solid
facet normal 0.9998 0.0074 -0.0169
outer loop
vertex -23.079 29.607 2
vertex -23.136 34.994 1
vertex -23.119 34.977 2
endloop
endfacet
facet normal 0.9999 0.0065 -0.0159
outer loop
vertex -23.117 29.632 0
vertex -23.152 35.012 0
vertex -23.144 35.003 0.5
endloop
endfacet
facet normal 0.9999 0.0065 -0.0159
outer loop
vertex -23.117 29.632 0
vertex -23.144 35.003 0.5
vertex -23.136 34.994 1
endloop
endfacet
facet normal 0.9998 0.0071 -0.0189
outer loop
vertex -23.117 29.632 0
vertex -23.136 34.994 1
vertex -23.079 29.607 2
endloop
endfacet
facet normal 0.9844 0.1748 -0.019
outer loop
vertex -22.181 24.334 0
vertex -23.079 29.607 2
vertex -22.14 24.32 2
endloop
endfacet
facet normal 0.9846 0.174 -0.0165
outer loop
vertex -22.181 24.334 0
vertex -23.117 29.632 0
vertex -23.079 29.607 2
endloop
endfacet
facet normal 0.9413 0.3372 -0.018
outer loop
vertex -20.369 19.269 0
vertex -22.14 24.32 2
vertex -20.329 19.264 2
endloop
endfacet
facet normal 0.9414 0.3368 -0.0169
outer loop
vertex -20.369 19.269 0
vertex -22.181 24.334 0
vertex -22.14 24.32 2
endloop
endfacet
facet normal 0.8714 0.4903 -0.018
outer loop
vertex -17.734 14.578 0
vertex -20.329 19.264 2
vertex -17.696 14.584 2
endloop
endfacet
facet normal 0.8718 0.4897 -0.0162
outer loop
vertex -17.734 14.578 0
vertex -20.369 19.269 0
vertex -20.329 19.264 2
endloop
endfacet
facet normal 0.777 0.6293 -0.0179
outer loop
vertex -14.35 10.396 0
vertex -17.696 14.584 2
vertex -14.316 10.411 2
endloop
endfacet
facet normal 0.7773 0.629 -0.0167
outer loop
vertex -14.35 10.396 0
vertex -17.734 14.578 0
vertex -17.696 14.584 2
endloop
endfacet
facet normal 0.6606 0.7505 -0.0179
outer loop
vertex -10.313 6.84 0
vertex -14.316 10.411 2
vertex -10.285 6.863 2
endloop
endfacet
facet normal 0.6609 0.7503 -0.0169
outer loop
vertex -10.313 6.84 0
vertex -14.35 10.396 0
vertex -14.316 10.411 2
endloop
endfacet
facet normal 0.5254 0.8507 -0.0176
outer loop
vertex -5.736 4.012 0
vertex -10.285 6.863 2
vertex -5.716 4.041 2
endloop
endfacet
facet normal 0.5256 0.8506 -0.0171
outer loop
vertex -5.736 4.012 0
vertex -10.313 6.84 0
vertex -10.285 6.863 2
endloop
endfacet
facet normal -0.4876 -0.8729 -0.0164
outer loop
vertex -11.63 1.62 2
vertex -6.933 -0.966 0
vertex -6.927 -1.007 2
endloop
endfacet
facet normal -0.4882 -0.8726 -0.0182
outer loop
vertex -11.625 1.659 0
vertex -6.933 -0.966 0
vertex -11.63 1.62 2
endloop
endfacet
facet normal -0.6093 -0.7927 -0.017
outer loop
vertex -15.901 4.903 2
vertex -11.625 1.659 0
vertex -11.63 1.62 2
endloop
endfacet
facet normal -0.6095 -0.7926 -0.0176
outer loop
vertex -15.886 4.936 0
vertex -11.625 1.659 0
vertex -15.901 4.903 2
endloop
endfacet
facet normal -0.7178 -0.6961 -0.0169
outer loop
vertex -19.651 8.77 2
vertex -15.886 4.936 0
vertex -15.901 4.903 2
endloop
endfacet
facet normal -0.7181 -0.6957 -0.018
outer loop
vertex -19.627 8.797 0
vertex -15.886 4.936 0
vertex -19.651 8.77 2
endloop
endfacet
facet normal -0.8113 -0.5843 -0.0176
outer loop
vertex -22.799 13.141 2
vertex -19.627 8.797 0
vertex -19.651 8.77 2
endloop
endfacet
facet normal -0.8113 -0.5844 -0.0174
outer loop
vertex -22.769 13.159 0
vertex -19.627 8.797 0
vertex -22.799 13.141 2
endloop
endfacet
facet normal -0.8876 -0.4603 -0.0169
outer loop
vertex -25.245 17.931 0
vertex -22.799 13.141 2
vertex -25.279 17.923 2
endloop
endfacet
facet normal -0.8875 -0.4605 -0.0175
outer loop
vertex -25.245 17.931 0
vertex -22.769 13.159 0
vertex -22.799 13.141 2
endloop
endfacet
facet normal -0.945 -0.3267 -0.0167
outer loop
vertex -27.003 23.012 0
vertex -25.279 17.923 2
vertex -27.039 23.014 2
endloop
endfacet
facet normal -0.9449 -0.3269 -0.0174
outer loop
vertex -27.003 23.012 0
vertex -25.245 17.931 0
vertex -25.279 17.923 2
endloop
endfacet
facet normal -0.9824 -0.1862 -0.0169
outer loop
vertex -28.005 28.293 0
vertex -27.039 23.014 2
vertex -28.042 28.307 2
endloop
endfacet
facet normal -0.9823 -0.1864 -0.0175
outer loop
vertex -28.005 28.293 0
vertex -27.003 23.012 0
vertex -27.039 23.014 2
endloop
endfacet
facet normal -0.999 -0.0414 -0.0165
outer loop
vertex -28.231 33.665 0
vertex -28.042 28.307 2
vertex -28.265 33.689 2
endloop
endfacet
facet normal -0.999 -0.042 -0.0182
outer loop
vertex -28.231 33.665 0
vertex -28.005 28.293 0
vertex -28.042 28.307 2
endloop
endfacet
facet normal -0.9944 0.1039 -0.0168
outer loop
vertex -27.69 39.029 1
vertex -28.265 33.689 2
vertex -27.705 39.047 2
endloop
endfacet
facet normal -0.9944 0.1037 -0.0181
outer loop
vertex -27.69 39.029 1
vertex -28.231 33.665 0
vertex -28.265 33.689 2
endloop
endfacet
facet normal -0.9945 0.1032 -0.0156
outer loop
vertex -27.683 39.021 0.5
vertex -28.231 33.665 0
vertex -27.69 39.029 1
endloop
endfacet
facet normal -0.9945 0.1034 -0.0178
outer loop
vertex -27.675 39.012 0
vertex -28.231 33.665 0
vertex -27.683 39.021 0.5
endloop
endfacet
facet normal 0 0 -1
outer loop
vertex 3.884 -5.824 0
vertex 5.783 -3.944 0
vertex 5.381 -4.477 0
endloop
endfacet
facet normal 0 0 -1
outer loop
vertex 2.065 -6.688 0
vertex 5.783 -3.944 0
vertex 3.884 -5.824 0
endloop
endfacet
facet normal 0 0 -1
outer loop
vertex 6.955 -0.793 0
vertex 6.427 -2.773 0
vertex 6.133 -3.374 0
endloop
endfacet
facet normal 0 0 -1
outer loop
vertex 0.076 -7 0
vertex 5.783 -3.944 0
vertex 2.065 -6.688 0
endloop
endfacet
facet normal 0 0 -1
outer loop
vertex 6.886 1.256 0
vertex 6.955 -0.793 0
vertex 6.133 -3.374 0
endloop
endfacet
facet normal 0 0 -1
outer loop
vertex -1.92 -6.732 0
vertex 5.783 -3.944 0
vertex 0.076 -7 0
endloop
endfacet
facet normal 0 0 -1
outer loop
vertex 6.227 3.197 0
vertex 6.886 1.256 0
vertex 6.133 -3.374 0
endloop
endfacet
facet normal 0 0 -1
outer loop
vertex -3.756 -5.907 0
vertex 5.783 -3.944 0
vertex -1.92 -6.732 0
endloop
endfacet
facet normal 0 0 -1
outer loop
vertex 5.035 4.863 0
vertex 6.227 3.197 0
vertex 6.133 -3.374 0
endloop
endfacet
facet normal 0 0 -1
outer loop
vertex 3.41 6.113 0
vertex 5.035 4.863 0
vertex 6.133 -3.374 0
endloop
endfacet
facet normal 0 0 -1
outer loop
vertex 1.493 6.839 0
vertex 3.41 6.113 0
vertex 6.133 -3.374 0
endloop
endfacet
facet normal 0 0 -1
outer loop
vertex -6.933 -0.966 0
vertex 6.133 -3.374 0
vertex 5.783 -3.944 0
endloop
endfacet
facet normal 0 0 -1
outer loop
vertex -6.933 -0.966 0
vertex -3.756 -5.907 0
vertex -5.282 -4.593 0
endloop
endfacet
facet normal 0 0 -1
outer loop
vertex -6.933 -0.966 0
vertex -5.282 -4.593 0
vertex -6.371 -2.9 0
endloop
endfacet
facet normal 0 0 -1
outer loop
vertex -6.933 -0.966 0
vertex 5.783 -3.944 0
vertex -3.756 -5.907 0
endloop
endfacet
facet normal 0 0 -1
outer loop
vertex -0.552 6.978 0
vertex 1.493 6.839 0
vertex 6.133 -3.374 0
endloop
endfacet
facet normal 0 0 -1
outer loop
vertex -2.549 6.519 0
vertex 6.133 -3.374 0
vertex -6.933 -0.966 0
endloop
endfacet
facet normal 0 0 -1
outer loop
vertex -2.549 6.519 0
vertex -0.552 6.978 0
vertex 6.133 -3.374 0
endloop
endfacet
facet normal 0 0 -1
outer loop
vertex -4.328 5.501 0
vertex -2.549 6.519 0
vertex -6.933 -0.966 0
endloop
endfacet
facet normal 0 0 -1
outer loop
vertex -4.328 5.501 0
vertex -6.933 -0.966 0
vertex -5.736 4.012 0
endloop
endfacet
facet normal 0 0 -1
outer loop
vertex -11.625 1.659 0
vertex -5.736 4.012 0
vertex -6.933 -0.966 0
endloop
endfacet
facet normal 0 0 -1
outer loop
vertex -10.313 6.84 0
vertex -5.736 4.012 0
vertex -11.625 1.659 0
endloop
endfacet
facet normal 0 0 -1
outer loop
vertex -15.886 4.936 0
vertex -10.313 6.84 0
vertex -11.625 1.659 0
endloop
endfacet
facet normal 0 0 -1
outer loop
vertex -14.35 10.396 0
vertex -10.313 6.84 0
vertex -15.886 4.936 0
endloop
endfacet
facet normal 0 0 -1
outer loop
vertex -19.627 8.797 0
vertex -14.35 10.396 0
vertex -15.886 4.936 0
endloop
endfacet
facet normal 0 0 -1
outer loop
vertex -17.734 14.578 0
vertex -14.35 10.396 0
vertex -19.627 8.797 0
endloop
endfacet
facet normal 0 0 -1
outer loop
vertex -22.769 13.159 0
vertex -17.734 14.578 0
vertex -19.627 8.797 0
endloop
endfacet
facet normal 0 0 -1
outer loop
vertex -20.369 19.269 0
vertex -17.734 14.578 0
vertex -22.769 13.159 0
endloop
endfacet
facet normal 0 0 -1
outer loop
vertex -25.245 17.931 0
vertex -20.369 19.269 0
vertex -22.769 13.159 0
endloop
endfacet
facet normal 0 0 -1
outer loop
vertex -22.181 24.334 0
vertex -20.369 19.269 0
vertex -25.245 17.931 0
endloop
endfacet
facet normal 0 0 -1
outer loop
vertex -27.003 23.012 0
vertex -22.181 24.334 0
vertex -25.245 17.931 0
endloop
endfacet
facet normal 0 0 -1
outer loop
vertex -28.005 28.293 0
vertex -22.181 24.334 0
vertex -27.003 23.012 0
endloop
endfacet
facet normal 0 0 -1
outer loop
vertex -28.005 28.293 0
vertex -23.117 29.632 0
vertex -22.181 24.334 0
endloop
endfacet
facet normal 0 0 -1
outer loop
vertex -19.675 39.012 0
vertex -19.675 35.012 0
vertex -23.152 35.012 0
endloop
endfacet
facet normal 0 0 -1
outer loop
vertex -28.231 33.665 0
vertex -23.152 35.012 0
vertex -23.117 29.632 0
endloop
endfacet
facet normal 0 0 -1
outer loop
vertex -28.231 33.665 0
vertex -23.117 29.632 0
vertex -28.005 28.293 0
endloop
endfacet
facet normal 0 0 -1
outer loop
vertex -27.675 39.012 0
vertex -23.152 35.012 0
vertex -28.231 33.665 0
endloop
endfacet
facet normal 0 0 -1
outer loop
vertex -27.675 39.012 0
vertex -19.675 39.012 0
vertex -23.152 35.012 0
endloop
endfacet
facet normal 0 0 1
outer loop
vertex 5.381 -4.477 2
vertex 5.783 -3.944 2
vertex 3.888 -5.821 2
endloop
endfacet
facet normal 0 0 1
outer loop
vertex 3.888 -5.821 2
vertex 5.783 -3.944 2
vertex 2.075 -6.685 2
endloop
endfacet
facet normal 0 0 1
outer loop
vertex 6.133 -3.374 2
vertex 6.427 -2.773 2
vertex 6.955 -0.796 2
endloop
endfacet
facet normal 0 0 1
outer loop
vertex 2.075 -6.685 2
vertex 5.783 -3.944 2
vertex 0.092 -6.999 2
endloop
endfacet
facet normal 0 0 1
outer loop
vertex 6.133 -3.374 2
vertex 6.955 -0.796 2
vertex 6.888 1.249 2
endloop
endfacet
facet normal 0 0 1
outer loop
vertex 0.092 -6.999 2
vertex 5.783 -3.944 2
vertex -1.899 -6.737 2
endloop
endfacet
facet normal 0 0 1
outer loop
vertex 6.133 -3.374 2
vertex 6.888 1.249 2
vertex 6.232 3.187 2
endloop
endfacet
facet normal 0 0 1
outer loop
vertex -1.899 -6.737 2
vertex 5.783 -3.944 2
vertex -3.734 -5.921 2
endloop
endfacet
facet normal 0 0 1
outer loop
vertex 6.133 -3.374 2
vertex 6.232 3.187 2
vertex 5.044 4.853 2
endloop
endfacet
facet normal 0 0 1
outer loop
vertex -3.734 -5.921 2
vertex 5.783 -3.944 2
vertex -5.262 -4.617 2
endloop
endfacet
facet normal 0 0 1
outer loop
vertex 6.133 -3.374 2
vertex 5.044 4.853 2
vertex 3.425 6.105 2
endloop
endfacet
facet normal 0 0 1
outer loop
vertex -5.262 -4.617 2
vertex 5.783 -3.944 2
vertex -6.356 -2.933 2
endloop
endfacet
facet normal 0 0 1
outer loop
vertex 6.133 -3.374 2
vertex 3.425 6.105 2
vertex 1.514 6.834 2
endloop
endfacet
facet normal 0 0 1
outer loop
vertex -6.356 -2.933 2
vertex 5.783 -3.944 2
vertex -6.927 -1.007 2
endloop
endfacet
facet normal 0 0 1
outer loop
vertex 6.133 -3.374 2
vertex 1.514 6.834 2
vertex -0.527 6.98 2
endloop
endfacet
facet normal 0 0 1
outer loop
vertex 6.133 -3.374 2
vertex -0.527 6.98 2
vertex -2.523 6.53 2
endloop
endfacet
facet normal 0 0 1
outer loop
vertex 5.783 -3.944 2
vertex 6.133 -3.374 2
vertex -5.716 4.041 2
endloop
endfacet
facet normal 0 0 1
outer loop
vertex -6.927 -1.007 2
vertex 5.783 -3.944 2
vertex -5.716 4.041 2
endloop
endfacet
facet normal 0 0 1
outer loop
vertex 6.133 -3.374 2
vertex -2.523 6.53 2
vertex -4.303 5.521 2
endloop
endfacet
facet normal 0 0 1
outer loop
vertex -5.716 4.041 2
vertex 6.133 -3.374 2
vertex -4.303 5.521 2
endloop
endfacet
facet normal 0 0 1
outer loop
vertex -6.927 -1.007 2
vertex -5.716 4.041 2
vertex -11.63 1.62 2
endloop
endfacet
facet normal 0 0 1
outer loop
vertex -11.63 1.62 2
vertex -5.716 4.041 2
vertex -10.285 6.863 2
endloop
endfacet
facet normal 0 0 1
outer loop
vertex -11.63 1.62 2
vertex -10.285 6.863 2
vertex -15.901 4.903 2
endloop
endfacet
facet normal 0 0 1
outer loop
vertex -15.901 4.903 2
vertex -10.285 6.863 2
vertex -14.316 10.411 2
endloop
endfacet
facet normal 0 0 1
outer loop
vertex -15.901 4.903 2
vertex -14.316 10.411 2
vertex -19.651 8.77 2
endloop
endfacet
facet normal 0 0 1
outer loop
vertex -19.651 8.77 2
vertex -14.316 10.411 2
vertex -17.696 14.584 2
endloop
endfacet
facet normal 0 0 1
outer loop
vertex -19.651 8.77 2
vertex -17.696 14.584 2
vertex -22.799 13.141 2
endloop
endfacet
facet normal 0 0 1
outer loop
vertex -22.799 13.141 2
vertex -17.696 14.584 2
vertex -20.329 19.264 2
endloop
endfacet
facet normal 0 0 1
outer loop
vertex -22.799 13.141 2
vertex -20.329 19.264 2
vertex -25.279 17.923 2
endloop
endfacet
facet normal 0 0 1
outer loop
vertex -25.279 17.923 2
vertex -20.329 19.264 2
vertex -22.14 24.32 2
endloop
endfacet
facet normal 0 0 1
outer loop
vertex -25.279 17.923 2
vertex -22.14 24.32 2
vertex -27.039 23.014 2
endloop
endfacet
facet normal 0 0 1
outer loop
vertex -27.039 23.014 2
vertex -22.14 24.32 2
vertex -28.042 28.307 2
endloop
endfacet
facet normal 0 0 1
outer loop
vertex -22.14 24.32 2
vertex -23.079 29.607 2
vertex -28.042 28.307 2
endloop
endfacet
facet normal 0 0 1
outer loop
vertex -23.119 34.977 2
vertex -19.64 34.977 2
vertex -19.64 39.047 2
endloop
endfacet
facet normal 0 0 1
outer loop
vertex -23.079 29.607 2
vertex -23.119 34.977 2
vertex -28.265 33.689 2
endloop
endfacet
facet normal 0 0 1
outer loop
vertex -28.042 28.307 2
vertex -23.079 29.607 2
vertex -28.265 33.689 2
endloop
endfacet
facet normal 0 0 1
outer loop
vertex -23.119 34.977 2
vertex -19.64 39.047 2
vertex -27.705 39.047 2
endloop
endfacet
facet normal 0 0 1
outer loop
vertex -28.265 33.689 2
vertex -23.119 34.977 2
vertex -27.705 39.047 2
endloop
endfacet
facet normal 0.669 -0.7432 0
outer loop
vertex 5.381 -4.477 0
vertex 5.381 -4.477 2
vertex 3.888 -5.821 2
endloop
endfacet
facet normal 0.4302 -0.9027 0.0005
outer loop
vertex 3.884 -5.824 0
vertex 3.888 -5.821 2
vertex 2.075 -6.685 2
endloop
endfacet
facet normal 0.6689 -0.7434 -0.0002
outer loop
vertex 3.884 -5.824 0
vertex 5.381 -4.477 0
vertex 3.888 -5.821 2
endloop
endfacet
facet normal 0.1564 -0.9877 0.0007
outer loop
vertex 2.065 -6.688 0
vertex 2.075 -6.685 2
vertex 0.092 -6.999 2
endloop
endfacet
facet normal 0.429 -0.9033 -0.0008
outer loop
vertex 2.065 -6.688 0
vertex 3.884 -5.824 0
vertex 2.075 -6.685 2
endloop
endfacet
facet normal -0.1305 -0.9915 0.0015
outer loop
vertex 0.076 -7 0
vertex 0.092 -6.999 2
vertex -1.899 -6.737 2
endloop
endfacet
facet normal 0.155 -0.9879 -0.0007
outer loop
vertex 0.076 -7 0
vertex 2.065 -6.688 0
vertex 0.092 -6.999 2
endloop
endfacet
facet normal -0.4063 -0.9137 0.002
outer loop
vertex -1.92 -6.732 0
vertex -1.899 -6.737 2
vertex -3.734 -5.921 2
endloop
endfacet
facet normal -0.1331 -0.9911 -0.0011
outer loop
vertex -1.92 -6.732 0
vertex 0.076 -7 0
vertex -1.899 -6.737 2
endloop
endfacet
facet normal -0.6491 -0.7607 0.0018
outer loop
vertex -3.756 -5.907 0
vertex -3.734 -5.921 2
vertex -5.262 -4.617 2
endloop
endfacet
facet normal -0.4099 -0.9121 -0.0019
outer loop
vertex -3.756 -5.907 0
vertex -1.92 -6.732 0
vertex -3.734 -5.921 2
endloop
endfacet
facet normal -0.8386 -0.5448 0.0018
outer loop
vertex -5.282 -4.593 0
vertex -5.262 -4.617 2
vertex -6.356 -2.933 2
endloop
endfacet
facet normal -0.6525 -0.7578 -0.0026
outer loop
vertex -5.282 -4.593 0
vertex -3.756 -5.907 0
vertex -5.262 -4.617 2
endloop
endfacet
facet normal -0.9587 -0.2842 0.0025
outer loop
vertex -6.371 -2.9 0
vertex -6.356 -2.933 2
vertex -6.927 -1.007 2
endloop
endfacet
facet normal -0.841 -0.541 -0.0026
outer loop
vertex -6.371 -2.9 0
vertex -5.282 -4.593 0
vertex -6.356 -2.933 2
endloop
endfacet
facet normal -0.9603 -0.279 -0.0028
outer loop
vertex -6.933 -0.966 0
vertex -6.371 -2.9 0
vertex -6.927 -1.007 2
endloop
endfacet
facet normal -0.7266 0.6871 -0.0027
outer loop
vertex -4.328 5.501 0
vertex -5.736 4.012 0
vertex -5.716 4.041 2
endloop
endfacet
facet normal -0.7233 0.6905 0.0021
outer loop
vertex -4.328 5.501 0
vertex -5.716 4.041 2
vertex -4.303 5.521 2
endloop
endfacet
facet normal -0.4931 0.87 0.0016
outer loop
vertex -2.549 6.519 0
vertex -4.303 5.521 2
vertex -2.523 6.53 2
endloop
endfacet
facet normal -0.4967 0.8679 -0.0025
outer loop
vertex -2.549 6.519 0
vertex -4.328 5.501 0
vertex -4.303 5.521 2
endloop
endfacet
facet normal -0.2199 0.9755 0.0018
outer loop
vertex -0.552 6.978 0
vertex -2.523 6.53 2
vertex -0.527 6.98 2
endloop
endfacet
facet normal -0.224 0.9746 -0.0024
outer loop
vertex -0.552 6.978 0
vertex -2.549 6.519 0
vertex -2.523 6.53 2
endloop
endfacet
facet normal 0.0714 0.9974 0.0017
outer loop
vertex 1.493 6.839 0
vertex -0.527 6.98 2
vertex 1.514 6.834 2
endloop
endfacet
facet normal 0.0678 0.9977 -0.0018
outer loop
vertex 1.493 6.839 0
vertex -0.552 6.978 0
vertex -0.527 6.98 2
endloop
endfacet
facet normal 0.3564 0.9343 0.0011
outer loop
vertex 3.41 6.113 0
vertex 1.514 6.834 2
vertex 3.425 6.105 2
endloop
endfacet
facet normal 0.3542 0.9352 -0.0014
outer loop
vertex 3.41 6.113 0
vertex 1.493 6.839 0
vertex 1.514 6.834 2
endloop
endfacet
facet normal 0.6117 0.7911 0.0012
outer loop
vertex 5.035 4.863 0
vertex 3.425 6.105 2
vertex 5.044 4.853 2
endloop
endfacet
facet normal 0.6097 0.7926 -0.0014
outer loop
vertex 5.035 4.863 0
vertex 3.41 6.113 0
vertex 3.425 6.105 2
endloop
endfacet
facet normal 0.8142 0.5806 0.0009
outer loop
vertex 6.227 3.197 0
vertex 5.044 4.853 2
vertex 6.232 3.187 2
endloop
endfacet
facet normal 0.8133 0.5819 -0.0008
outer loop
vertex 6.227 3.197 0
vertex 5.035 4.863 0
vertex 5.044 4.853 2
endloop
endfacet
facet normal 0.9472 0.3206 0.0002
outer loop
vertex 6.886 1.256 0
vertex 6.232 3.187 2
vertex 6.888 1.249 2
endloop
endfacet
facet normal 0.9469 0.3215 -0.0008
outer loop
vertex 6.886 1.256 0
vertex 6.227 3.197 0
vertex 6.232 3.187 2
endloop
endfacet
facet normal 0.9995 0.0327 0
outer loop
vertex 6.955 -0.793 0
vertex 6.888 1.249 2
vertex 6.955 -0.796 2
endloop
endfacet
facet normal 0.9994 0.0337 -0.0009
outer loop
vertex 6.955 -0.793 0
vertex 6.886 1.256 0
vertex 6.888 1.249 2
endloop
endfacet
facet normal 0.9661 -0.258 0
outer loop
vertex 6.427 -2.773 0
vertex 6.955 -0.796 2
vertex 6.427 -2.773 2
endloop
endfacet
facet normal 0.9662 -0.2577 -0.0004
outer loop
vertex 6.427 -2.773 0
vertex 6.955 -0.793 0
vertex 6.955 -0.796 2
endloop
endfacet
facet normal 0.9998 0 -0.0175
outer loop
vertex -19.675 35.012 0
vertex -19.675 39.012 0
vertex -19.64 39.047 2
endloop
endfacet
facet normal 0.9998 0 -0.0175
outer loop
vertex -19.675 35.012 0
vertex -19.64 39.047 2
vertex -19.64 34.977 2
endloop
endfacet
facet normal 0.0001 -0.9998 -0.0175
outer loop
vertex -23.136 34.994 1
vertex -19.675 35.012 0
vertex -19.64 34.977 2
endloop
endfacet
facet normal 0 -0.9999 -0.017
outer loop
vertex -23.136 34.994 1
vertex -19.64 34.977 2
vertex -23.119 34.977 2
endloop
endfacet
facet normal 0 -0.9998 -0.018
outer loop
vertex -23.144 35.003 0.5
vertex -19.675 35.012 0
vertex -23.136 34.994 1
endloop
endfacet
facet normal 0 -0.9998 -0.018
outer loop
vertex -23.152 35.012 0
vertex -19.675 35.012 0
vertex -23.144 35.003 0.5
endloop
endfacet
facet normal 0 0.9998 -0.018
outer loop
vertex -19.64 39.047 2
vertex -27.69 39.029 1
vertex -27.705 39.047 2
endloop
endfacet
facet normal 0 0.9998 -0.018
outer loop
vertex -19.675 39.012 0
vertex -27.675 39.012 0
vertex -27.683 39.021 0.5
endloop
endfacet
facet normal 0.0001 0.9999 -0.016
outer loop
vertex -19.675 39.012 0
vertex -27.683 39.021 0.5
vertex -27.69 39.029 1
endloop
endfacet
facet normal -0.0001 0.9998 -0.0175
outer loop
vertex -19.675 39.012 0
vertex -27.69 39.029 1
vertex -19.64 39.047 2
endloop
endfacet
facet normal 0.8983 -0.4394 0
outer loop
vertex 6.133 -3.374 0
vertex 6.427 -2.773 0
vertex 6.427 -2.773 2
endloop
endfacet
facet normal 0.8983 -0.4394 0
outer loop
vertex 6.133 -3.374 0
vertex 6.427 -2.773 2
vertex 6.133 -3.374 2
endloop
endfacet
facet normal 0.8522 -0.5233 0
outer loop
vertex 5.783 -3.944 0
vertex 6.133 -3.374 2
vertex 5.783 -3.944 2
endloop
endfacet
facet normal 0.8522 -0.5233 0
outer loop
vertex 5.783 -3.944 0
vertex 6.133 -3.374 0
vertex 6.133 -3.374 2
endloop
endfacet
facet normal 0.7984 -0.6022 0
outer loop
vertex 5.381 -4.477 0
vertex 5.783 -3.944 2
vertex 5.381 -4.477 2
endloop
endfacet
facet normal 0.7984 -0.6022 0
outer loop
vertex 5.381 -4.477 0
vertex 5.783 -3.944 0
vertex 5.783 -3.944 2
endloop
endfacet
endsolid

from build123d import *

# Parameters (mm, degrees)
BOSS_EXTRU_2_DEPTH = 2
BOSS_EXTRU_8_DEPTH = 2
BOSS_EXTRU_8_DRAFT = 1


with BuildPart() as part:
    # Esquisse1 → Boss.-Extru.2 (new body)
    with BuildSketch(Plane.XY):
        with BuildLine():
            ThreePointArc((6.427291801, -2.77307052), (5.965216185, -3.662812562), (5.380773926, -4.477418002))
            ThreePointArc((5.380773926, -4.477418002), (-5.965216185, 3.662812562), (6.427291801, -2.77307052))
        make_face()
    extrude(amount=BOSS_EXTRU_2_DEPTH)


with BuildPart() as boss_extru_8_tool:
    # Esquisse7 → Boss.-Extru.8 (with draft: the straight prism first)
    with BuildSketch(Plane(origin=(0, 0, 0), x_dir=(-1, 0, 0), z_dir=(0, 0, -1))):
        with BuildLine():
            Line((27.675381467, 39.011893522), (19.675381467, 39.011893522))
            Line((19.675381467, 39.011893522), (19.675381467, 35.011893522))
            Line((19.675381467, 35.011893522), (23.151678354, 35.011893522))
            ThreePointArc((23.151678354, 35.011893522), (19.150512425, 16.86781666), (5.736262752, 4.011893522))
            ThreePointArc((5.736262752, 4.011893522), (6.806086868, 1.636209506), (6.933004295, -0.966152912))
            ThreePointArc((6.933004295, -0.966152912), (24.093742024, 15.500152171), (27.675381467, 39.011893522))
        make_face()
    extrude(amount=-BOSS_EXTRU_8_DEPTH)
    # Boss.-Extru.8: the draft: its side faces are tilted about the plane it starts from
    boss_extru_8_sides = [boss_extru_8_tool.faces().sort_by_distance(p)[0] for p in [
        (-24.093742024, 15.500152171, 1),
        (-23.675381467, 39.011893522, 1),
        (-19.675381467, 37.011893522, 1),
        (-21.413529911, 35.011893522, 1),
        (-19.150512425, 16.86781666, 1),
        (-6.806086868, 1.636209506, 1),
    ]]
    draft(boss_extru_8_sides, Plane(origin=(0, 0, 0), x_dir=(-1, 0, 0), z_dir=(0, 0, -1)), BOSS_EXTRU_8_DRAFT)


with BuildPart() as part_1:
    add(part.part)

    # Boss.-Extru.8: add boss_extru_8_tool
    add(boss_extru_8_tool.part)


solid = part_1.part
